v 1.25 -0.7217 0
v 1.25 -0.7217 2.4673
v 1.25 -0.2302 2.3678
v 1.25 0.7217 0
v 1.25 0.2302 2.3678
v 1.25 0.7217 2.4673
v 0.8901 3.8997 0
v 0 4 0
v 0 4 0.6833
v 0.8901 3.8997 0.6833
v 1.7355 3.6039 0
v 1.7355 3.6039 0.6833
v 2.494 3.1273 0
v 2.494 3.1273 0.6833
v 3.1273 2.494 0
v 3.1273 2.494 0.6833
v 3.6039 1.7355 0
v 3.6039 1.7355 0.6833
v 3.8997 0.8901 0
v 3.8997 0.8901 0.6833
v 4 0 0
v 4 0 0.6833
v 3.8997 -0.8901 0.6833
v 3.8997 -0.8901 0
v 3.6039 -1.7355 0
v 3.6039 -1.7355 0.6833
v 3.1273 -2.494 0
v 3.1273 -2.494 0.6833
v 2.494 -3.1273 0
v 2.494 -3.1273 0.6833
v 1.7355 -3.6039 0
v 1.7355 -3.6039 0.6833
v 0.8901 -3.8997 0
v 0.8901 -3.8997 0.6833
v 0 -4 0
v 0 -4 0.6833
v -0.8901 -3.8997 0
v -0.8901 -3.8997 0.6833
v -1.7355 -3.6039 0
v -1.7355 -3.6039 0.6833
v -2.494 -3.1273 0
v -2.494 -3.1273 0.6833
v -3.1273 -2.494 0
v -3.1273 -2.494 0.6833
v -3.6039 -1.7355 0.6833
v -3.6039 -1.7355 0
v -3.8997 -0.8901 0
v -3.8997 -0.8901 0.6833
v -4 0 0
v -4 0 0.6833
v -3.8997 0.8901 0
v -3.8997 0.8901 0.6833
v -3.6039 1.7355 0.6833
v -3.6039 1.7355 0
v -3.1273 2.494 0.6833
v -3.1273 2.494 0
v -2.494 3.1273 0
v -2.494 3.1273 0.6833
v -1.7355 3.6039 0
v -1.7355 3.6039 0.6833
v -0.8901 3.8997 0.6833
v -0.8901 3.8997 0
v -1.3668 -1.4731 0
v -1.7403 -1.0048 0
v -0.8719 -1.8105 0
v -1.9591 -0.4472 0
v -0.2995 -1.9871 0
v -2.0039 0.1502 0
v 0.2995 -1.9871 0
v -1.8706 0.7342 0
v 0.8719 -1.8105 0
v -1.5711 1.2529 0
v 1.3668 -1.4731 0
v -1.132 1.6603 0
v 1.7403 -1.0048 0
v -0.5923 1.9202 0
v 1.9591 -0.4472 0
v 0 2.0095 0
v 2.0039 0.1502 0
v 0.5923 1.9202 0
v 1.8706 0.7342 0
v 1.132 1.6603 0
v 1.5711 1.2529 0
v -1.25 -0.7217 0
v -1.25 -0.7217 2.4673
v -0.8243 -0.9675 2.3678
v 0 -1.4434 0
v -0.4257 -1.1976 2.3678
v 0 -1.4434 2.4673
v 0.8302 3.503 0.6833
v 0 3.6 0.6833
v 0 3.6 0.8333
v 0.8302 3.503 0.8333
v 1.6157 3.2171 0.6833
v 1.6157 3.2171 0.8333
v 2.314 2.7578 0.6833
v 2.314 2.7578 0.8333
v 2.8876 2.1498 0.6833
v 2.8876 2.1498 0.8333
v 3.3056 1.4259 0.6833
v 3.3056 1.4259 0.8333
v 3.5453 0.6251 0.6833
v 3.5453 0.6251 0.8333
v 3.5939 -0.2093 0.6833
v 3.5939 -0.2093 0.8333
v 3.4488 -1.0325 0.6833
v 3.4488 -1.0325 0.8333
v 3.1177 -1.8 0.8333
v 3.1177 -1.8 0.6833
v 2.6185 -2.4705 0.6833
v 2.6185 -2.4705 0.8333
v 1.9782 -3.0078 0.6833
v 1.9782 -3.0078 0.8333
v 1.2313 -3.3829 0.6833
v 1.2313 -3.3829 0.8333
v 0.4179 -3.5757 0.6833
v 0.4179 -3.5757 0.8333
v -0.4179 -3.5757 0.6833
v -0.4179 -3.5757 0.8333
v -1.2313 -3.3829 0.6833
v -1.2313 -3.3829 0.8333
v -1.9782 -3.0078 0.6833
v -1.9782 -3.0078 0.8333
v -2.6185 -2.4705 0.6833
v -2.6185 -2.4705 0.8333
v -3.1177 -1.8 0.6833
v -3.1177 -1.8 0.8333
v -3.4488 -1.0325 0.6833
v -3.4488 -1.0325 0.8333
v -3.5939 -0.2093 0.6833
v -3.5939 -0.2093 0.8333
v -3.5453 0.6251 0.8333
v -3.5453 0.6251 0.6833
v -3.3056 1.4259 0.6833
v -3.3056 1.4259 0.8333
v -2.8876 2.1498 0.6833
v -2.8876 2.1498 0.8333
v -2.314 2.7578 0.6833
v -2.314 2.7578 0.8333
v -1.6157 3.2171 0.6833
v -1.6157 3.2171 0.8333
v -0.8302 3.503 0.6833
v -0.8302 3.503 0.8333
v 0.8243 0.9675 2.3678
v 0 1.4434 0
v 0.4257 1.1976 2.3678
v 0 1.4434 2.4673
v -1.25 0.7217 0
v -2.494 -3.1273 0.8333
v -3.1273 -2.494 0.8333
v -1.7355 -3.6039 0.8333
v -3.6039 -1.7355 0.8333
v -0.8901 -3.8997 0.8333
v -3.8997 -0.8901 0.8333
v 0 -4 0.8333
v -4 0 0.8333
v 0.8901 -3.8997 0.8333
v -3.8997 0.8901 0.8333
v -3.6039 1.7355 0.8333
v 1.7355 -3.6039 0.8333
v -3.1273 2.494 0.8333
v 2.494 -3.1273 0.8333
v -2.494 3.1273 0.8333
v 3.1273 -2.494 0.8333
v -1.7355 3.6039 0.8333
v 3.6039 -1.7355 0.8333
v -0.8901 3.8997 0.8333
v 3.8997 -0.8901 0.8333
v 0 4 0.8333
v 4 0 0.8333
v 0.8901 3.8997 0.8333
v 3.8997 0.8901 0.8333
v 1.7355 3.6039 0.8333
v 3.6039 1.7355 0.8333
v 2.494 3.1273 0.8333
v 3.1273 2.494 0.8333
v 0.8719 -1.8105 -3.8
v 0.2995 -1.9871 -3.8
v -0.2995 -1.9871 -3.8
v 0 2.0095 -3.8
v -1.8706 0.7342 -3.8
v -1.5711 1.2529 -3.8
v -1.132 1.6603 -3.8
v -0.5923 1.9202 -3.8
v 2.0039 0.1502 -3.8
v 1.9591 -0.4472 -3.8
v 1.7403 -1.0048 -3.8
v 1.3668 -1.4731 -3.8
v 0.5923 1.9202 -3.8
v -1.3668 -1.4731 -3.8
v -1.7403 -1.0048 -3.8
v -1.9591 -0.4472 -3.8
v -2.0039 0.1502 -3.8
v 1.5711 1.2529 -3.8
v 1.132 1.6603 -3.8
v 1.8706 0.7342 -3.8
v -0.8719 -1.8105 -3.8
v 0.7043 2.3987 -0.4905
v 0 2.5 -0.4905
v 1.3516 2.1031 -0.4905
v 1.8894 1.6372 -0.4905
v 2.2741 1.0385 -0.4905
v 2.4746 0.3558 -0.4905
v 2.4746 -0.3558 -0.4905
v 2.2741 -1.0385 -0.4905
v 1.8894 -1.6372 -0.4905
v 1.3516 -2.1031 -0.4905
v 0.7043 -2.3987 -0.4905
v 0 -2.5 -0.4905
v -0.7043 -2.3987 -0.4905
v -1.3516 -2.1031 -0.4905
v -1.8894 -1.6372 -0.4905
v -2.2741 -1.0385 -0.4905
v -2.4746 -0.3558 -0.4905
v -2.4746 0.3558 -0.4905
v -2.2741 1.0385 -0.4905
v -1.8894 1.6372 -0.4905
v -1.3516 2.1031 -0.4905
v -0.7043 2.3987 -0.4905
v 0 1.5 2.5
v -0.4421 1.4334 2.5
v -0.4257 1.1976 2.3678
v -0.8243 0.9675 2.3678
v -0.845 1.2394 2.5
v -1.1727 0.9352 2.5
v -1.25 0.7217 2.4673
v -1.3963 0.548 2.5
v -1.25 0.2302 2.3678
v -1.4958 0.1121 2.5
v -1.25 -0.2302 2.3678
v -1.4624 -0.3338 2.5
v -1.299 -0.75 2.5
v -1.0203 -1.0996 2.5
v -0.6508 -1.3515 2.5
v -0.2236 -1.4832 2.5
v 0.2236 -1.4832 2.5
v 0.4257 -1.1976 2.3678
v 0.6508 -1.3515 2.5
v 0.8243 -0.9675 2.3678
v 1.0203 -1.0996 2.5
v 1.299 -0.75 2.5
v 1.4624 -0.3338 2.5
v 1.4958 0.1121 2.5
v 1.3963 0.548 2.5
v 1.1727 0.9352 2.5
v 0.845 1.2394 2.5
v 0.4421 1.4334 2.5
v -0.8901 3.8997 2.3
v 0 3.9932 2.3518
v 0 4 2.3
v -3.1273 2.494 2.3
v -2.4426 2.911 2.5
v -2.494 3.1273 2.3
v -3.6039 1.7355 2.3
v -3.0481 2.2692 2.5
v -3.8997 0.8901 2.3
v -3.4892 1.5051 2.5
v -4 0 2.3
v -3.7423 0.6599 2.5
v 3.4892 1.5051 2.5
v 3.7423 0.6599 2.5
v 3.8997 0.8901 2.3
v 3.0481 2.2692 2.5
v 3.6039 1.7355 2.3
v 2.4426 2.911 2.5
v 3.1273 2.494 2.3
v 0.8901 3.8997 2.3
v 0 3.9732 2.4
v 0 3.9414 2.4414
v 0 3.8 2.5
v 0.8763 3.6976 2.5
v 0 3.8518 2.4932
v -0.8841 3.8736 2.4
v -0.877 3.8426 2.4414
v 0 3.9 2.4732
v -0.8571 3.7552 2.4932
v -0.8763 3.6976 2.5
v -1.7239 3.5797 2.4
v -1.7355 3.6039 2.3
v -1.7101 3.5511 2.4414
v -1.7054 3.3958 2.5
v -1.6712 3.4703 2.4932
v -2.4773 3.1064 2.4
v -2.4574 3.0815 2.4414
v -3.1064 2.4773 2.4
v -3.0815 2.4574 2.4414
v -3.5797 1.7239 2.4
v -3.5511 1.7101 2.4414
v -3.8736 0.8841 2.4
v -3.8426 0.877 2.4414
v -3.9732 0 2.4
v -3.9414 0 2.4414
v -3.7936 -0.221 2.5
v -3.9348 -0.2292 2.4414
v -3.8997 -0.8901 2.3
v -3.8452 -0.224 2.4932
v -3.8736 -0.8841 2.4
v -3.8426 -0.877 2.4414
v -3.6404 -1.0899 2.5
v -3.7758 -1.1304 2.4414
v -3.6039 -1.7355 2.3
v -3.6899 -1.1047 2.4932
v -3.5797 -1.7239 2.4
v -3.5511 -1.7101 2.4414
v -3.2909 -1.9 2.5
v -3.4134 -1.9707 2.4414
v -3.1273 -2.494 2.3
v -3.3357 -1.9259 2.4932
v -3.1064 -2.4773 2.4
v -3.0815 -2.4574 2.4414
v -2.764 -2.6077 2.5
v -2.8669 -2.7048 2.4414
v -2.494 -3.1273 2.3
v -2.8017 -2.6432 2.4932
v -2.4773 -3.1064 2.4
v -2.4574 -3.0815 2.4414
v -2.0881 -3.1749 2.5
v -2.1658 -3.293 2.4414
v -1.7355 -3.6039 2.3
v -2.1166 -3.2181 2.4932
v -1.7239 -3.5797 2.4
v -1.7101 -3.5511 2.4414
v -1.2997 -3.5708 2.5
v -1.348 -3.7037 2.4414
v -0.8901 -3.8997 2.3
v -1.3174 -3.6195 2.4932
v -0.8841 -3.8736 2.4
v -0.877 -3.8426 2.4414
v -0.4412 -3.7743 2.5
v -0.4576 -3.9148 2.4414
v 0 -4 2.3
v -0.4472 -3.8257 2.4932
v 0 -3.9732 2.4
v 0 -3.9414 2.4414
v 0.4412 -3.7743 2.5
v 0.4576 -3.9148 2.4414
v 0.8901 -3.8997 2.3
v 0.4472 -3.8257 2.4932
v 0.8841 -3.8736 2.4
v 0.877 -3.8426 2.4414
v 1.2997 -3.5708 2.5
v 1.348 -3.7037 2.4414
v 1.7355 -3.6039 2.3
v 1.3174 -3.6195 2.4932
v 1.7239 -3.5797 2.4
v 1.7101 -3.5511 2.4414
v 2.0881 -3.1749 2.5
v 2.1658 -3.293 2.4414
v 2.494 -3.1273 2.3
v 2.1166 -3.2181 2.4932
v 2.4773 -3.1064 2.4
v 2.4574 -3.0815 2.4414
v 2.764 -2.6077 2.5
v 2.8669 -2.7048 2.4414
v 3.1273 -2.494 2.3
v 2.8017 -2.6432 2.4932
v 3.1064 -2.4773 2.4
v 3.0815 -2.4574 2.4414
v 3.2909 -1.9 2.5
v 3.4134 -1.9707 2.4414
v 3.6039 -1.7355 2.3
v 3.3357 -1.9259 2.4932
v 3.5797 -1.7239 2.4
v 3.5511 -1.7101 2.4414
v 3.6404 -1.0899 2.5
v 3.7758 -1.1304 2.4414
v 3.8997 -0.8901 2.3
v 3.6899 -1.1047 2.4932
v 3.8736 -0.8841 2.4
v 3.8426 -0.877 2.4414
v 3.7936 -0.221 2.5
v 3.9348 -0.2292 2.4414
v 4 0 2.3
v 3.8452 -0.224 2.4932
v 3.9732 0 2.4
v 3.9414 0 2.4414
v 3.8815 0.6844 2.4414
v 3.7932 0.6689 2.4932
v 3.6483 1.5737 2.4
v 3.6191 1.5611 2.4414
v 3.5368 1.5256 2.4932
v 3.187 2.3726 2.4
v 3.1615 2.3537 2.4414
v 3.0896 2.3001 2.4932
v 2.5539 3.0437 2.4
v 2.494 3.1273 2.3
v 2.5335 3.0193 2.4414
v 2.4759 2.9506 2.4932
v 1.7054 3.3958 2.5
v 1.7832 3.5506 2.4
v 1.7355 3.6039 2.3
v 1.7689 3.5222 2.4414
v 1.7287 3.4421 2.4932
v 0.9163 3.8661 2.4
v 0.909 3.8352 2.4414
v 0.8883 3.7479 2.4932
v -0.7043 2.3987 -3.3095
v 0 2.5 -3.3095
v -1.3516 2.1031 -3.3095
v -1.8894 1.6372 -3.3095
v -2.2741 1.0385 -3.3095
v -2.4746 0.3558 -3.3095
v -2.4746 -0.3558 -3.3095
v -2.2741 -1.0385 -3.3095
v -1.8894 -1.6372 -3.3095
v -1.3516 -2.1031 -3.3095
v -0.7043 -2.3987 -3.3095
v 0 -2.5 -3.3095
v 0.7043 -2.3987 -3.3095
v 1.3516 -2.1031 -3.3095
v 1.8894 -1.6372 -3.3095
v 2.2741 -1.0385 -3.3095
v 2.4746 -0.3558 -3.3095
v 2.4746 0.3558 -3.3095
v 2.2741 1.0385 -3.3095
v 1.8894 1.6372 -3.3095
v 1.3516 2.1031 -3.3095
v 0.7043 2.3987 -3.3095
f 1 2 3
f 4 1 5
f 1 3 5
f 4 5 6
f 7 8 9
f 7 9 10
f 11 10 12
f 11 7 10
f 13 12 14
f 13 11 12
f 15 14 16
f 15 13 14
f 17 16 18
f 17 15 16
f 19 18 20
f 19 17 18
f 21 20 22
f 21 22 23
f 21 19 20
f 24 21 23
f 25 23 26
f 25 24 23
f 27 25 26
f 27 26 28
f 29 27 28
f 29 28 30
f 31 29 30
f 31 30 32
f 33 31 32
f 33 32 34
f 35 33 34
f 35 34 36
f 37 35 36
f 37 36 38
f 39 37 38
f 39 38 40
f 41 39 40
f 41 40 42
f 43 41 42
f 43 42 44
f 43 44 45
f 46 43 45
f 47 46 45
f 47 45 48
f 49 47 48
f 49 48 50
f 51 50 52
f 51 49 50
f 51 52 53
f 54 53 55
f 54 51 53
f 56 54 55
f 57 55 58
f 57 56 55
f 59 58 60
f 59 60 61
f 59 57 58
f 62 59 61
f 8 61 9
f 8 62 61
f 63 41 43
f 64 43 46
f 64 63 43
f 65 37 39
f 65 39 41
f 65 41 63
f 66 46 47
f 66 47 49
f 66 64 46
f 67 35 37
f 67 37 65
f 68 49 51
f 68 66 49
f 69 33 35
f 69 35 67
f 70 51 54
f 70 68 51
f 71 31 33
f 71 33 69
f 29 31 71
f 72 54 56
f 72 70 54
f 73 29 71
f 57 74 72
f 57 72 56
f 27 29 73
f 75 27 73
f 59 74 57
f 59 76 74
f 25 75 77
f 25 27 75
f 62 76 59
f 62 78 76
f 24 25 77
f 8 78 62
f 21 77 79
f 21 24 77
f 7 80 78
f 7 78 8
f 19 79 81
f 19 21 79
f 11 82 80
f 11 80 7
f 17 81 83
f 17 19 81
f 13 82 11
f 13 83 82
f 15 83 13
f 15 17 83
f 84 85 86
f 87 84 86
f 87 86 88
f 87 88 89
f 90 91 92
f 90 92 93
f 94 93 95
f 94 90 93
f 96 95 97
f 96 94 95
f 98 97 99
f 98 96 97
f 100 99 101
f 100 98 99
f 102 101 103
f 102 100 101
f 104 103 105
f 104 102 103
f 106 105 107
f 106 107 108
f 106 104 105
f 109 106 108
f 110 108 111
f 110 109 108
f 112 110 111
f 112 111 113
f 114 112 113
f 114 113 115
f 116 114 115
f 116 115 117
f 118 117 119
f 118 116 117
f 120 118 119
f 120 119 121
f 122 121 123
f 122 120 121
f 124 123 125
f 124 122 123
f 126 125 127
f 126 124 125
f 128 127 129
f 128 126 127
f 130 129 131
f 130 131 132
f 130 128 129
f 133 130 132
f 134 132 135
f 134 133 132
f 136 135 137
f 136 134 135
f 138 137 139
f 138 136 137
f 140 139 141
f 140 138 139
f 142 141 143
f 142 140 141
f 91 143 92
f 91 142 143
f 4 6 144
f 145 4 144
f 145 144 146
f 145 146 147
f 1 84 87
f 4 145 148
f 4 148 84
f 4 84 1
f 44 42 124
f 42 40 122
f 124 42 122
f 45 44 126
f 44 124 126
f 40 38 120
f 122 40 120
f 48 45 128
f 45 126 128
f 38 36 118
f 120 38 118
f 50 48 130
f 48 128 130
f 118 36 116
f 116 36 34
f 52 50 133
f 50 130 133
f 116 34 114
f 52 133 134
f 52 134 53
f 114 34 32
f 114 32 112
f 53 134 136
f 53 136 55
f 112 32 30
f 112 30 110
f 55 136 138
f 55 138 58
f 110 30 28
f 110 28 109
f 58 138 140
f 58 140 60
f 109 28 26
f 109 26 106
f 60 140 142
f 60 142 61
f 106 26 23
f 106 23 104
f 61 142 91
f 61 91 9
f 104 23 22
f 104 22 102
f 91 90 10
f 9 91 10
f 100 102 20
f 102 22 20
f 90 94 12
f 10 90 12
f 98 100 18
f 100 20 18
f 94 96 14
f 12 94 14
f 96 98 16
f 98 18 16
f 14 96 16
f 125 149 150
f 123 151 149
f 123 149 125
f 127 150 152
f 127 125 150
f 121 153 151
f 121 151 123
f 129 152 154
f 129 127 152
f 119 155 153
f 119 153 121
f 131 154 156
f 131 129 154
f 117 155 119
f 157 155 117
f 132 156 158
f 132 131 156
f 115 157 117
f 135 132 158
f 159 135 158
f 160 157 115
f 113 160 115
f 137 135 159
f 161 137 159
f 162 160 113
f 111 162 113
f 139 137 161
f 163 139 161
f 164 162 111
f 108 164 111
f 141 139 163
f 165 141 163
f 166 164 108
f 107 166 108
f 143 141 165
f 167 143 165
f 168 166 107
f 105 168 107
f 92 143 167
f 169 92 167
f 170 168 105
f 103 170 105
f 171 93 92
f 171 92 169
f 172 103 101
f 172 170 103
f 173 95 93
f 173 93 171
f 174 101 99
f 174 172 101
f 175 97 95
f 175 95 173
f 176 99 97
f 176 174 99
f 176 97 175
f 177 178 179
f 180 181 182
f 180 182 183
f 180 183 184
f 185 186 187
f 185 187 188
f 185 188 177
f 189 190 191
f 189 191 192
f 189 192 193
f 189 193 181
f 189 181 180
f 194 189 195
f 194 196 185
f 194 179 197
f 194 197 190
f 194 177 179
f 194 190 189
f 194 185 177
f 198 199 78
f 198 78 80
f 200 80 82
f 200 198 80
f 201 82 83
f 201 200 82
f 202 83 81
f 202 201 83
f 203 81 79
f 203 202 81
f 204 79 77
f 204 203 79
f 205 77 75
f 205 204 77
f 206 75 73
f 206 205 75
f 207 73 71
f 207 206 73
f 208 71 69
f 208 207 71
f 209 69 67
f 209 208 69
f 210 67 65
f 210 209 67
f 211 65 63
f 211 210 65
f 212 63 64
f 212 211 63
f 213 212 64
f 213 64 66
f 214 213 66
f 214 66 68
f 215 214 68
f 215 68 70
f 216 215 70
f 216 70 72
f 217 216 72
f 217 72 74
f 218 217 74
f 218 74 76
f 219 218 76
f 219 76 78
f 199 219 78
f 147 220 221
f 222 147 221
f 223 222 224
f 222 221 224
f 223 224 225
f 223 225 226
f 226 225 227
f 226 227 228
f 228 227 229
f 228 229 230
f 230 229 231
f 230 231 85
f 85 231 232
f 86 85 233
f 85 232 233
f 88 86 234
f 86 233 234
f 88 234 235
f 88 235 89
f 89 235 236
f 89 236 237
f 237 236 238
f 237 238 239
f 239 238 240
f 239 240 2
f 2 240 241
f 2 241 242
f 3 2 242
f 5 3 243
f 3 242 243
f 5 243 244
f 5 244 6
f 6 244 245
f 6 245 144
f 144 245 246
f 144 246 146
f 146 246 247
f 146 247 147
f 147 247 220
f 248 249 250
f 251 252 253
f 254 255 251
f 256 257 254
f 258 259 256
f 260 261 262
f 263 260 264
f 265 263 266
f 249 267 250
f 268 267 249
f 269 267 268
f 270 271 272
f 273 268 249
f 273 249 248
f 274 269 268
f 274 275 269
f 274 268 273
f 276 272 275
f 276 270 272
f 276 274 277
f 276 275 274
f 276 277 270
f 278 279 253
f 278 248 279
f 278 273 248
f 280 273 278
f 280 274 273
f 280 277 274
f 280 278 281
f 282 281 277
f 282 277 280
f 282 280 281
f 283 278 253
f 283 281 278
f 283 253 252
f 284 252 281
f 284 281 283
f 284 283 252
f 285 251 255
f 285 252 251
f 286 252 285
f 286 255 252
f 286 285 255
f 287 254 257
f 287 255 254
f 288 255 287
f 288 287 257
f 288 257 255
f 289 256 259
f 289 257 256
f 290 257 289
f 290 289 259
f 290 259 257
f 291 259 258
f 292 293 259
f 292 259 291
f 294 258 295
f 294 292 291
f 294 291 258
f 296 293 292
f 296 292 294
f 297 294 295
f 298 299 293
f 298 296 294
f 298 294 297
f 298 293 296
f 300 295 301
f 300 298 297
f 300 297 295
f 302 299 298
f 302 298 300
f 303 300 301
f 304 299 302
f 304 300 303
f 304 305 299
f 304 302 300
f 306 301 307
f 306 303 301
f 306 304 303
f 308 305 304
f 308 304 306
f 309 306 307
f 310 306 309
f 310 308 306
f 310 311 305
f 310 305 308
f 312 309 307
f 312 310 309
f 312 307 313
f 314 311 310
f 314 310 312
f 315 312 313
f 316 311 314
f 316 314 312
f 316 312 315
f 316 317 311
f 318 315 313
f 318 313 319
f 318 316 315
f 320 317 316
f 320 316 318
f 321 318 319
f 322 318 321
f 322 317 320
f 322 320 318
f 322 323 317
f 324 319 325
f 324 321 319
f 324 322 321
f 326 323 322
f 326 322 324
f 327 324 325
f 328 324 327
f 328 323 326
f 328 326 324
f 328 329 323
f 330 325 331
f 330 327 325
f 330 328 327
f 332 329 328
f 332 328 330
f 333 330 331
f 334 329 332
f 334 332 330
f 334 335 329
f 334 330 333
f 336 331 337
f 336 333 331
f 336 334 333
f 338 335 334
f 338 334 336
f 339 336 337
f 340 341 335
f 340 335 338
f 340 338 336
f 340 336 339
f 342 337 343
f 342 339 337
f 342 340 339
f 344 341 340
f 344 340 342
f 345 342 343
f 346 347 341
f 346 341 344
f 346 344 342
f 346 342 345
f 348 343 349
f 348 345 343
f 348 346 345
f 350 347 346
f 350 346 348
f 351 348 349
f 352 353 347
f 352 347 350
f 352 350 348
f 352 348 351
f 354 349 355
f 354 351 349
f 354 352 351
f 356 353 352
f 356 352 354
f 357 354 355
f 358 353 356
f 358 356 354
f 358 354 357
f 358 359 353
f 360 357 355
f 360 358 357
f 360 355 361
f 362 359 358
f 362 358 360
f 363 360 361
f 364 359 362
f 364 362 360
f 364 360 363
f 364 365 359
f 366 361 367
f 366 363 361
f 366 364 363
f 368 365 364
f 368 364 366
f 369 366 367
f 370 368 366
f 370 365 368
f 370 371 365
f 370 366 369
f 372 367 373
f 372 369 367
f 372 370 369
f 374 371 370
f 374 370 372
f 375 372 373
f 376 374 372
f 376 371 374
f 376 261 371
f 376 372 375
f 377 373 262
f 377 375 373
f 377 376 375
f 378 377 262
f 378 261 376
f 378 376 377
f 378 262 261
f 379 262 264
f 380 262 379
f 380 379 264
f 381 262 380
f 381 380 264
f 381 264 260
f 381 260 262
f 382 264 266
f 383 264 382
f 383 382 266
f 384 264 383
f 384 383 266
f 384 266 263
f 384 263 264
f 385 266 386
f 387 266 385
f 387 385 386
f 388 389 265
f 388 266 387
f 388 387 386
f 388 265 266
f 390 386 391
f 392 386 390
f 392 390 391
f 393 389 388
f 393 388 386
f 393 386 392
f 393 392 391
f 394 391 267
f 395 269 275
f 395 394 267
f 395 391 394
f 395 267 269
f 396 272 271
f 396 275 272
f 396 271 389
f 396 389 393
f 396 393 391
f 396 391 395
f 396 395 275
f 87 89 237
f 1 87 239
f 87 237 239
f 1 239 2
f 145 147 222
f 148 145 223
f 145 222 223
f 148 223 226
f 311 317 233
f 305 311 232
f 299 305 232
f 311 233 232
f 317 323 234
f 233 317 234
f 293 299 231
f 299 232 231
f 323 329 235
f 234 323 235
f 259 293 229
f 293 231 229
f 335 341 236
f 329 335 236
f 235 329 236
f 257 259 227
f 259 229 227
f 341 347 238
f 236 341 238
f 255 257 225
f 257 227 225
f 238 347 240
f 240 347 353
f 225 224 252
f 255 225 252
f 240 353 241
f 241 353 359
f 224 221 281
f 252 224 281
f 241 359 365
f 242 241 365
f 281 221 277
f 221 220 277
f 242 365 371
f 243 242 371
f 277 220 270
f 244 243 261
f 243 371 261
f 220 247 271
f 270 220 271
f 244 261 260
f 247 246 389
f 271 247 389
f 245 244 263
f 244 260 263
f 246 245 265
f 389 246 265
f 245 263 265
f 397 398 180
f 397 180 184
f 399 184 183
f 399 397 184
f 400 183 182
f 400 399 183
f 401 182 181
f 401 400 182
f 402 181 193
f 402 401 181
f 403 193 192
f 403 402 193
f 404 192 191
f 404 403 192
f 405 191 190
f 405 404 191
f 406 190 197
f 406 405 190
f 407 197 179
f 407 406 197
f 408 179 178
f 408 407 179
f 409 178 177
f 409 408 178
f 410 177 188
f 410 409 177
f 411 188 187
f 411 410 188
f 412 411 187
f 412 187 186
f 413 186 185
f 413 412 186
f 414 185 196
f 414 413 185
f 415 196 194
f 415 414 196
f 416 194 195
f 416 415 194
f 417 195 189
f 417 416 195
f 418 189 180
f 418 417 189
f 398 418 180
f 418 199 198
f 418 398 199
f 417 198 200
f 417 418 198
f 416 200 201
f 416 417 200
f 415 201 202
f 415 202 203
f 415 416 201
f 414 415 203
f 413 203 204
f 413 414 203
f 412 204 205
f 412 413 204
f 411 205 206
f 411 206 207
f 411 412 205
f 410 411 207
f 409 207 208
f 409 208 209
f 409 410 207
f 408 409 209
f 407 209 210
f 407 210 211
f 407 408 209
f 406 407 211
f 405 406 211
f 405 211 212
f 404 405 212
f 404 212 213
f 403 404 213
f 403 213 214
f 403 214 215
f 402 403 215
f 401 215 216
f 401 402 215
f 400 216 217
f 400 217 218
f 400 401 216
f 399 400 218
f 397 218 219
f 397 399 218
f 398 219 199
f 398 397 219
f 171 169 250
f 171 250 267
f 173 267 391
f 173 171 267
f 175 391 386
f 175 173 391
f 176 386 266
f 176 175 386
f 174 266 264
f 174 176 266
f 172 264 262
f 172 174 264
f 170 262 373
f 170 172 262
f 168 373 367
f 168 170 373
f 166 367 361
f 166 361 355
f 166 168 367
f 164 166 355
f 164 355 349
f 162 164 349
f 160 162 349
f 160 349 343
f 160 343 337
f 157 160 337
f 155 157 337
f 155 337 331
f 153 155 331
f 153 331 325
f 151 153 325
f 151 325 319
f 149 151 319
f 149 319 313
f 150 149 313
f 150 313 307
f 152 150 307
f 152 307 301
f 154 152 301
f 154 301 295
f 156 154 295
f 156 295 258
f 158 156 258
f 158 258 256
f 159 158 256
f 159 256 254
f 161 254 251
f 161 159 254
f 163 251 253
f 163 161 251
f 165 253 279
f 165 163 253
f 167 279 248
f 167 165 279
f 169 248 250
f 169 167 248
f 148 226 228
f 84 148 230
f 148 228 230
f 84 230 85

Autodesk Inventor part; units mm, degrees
sketch "Sketch_1" plane through (0, 0, 0) normal (1, 0, 0) x (0, 1, 0)
  line L0 (0, -3.8) -> (0, 1.634)
  line L1 (0, 1.634) -> (1.5, 2.5)
  line L2 (1.5, 2.5) -> (3.8, 2.5)
  arc A0 (4, 2.3) -> (3.8, 2.5) centre (3.8, 2.3) ccw
  line L3 (4, 2.3) -> (4, 0.8333)
  line L4 (4, 0.8333) -> (3.6, 0.8333)
  line L5 (3.6, 0.8333) -> (3.6, 0.6833)
  line L6 (3.6, 0.6833) -> (4, 0.6833)
  line L7 (4, 0.6833) -> (4, 0)
  line L8 (4, 0) -> (2.0095, 0)
  line L9 (2.0095, 0) -> (2.5, -0.4905)
  line L10 (2.5, -0.4905) -> (2.5, -3.3095)
  line L11 (2.5, -3.3095) -> (2.0095, -3.8)
  line L12 (2.0095, -3.8) -> (0, -3.8)
  line L13 (0, -3.8) -> (0, 1.634)
revolve "Revolution1" add sketch "Sketch_1" angle 360 about axis through (0, 0, -3.8) along (0, 0, -1)
thread "Thread1" size "M5x0.8" class "6g" standard "ISO Metric profile" full length
sketch "Skizze_4" plane through (0, 0, 2.5) normal (0, 0, 1) x (1, 0, 0)
  line L0 (-1.25, -0.7217) -> (0, -1.4434)
  line L1 (0, -1.4434) -> (1.25, -0.7217)
  line L2 (1.25, -0.7217) -> (1.25, 0.7217)
  line L3 (1.25, 0.7217) -> (0, 1.4434)
  line L4 (0, 1.4434) -> (-1.25, 0.7217)
  line L5 (-1.25, 0.7217) -> (-1.25, -0.7217)
extrude "Extrusion1" cut sketch "Skizze_4" against normal blind 2.5
ref_plane "ANBAU_XY" through (0, 0, 0) normal (0, 0, 1) x (1, 0, 0)
ref_plane "ANBAU_YZ" through (0, 0, 0) normal (1, 0, 0) x (0, 1, 0)
ref_plane "ANBAU_ZX" through (0, 0, 0) normal (0, 1, 0) x (0, 0, 1)
ref_plane "ANBAU_STD_XY" through (0, 0, 0) normal (0, 0, 1) x (1, 0, 0)
ref_plane "ANBAU_STD_YZ" through (0, 0, 0) normal (1, 0, 0) x (0, 1, 0)
ref_plane "ANBAU_STD_ZX" through (0, 0, 0) normal (0, 1, 0) x (0, 0, 1)
ref_plane "CPV_XY" through (0, 0, 0) normal (0, 0, 1) x (1, 0, 0)
ref_plane "CPV_YZ" through (0, 0, 0) normal (1, 0, 0) x (0, 1, 0)
ref_plane "CPV_ZX" through (0, 0, 0) normal (0, 1, 0) x (0, 0, 1)
properties part number "174308 B-M5-B"
